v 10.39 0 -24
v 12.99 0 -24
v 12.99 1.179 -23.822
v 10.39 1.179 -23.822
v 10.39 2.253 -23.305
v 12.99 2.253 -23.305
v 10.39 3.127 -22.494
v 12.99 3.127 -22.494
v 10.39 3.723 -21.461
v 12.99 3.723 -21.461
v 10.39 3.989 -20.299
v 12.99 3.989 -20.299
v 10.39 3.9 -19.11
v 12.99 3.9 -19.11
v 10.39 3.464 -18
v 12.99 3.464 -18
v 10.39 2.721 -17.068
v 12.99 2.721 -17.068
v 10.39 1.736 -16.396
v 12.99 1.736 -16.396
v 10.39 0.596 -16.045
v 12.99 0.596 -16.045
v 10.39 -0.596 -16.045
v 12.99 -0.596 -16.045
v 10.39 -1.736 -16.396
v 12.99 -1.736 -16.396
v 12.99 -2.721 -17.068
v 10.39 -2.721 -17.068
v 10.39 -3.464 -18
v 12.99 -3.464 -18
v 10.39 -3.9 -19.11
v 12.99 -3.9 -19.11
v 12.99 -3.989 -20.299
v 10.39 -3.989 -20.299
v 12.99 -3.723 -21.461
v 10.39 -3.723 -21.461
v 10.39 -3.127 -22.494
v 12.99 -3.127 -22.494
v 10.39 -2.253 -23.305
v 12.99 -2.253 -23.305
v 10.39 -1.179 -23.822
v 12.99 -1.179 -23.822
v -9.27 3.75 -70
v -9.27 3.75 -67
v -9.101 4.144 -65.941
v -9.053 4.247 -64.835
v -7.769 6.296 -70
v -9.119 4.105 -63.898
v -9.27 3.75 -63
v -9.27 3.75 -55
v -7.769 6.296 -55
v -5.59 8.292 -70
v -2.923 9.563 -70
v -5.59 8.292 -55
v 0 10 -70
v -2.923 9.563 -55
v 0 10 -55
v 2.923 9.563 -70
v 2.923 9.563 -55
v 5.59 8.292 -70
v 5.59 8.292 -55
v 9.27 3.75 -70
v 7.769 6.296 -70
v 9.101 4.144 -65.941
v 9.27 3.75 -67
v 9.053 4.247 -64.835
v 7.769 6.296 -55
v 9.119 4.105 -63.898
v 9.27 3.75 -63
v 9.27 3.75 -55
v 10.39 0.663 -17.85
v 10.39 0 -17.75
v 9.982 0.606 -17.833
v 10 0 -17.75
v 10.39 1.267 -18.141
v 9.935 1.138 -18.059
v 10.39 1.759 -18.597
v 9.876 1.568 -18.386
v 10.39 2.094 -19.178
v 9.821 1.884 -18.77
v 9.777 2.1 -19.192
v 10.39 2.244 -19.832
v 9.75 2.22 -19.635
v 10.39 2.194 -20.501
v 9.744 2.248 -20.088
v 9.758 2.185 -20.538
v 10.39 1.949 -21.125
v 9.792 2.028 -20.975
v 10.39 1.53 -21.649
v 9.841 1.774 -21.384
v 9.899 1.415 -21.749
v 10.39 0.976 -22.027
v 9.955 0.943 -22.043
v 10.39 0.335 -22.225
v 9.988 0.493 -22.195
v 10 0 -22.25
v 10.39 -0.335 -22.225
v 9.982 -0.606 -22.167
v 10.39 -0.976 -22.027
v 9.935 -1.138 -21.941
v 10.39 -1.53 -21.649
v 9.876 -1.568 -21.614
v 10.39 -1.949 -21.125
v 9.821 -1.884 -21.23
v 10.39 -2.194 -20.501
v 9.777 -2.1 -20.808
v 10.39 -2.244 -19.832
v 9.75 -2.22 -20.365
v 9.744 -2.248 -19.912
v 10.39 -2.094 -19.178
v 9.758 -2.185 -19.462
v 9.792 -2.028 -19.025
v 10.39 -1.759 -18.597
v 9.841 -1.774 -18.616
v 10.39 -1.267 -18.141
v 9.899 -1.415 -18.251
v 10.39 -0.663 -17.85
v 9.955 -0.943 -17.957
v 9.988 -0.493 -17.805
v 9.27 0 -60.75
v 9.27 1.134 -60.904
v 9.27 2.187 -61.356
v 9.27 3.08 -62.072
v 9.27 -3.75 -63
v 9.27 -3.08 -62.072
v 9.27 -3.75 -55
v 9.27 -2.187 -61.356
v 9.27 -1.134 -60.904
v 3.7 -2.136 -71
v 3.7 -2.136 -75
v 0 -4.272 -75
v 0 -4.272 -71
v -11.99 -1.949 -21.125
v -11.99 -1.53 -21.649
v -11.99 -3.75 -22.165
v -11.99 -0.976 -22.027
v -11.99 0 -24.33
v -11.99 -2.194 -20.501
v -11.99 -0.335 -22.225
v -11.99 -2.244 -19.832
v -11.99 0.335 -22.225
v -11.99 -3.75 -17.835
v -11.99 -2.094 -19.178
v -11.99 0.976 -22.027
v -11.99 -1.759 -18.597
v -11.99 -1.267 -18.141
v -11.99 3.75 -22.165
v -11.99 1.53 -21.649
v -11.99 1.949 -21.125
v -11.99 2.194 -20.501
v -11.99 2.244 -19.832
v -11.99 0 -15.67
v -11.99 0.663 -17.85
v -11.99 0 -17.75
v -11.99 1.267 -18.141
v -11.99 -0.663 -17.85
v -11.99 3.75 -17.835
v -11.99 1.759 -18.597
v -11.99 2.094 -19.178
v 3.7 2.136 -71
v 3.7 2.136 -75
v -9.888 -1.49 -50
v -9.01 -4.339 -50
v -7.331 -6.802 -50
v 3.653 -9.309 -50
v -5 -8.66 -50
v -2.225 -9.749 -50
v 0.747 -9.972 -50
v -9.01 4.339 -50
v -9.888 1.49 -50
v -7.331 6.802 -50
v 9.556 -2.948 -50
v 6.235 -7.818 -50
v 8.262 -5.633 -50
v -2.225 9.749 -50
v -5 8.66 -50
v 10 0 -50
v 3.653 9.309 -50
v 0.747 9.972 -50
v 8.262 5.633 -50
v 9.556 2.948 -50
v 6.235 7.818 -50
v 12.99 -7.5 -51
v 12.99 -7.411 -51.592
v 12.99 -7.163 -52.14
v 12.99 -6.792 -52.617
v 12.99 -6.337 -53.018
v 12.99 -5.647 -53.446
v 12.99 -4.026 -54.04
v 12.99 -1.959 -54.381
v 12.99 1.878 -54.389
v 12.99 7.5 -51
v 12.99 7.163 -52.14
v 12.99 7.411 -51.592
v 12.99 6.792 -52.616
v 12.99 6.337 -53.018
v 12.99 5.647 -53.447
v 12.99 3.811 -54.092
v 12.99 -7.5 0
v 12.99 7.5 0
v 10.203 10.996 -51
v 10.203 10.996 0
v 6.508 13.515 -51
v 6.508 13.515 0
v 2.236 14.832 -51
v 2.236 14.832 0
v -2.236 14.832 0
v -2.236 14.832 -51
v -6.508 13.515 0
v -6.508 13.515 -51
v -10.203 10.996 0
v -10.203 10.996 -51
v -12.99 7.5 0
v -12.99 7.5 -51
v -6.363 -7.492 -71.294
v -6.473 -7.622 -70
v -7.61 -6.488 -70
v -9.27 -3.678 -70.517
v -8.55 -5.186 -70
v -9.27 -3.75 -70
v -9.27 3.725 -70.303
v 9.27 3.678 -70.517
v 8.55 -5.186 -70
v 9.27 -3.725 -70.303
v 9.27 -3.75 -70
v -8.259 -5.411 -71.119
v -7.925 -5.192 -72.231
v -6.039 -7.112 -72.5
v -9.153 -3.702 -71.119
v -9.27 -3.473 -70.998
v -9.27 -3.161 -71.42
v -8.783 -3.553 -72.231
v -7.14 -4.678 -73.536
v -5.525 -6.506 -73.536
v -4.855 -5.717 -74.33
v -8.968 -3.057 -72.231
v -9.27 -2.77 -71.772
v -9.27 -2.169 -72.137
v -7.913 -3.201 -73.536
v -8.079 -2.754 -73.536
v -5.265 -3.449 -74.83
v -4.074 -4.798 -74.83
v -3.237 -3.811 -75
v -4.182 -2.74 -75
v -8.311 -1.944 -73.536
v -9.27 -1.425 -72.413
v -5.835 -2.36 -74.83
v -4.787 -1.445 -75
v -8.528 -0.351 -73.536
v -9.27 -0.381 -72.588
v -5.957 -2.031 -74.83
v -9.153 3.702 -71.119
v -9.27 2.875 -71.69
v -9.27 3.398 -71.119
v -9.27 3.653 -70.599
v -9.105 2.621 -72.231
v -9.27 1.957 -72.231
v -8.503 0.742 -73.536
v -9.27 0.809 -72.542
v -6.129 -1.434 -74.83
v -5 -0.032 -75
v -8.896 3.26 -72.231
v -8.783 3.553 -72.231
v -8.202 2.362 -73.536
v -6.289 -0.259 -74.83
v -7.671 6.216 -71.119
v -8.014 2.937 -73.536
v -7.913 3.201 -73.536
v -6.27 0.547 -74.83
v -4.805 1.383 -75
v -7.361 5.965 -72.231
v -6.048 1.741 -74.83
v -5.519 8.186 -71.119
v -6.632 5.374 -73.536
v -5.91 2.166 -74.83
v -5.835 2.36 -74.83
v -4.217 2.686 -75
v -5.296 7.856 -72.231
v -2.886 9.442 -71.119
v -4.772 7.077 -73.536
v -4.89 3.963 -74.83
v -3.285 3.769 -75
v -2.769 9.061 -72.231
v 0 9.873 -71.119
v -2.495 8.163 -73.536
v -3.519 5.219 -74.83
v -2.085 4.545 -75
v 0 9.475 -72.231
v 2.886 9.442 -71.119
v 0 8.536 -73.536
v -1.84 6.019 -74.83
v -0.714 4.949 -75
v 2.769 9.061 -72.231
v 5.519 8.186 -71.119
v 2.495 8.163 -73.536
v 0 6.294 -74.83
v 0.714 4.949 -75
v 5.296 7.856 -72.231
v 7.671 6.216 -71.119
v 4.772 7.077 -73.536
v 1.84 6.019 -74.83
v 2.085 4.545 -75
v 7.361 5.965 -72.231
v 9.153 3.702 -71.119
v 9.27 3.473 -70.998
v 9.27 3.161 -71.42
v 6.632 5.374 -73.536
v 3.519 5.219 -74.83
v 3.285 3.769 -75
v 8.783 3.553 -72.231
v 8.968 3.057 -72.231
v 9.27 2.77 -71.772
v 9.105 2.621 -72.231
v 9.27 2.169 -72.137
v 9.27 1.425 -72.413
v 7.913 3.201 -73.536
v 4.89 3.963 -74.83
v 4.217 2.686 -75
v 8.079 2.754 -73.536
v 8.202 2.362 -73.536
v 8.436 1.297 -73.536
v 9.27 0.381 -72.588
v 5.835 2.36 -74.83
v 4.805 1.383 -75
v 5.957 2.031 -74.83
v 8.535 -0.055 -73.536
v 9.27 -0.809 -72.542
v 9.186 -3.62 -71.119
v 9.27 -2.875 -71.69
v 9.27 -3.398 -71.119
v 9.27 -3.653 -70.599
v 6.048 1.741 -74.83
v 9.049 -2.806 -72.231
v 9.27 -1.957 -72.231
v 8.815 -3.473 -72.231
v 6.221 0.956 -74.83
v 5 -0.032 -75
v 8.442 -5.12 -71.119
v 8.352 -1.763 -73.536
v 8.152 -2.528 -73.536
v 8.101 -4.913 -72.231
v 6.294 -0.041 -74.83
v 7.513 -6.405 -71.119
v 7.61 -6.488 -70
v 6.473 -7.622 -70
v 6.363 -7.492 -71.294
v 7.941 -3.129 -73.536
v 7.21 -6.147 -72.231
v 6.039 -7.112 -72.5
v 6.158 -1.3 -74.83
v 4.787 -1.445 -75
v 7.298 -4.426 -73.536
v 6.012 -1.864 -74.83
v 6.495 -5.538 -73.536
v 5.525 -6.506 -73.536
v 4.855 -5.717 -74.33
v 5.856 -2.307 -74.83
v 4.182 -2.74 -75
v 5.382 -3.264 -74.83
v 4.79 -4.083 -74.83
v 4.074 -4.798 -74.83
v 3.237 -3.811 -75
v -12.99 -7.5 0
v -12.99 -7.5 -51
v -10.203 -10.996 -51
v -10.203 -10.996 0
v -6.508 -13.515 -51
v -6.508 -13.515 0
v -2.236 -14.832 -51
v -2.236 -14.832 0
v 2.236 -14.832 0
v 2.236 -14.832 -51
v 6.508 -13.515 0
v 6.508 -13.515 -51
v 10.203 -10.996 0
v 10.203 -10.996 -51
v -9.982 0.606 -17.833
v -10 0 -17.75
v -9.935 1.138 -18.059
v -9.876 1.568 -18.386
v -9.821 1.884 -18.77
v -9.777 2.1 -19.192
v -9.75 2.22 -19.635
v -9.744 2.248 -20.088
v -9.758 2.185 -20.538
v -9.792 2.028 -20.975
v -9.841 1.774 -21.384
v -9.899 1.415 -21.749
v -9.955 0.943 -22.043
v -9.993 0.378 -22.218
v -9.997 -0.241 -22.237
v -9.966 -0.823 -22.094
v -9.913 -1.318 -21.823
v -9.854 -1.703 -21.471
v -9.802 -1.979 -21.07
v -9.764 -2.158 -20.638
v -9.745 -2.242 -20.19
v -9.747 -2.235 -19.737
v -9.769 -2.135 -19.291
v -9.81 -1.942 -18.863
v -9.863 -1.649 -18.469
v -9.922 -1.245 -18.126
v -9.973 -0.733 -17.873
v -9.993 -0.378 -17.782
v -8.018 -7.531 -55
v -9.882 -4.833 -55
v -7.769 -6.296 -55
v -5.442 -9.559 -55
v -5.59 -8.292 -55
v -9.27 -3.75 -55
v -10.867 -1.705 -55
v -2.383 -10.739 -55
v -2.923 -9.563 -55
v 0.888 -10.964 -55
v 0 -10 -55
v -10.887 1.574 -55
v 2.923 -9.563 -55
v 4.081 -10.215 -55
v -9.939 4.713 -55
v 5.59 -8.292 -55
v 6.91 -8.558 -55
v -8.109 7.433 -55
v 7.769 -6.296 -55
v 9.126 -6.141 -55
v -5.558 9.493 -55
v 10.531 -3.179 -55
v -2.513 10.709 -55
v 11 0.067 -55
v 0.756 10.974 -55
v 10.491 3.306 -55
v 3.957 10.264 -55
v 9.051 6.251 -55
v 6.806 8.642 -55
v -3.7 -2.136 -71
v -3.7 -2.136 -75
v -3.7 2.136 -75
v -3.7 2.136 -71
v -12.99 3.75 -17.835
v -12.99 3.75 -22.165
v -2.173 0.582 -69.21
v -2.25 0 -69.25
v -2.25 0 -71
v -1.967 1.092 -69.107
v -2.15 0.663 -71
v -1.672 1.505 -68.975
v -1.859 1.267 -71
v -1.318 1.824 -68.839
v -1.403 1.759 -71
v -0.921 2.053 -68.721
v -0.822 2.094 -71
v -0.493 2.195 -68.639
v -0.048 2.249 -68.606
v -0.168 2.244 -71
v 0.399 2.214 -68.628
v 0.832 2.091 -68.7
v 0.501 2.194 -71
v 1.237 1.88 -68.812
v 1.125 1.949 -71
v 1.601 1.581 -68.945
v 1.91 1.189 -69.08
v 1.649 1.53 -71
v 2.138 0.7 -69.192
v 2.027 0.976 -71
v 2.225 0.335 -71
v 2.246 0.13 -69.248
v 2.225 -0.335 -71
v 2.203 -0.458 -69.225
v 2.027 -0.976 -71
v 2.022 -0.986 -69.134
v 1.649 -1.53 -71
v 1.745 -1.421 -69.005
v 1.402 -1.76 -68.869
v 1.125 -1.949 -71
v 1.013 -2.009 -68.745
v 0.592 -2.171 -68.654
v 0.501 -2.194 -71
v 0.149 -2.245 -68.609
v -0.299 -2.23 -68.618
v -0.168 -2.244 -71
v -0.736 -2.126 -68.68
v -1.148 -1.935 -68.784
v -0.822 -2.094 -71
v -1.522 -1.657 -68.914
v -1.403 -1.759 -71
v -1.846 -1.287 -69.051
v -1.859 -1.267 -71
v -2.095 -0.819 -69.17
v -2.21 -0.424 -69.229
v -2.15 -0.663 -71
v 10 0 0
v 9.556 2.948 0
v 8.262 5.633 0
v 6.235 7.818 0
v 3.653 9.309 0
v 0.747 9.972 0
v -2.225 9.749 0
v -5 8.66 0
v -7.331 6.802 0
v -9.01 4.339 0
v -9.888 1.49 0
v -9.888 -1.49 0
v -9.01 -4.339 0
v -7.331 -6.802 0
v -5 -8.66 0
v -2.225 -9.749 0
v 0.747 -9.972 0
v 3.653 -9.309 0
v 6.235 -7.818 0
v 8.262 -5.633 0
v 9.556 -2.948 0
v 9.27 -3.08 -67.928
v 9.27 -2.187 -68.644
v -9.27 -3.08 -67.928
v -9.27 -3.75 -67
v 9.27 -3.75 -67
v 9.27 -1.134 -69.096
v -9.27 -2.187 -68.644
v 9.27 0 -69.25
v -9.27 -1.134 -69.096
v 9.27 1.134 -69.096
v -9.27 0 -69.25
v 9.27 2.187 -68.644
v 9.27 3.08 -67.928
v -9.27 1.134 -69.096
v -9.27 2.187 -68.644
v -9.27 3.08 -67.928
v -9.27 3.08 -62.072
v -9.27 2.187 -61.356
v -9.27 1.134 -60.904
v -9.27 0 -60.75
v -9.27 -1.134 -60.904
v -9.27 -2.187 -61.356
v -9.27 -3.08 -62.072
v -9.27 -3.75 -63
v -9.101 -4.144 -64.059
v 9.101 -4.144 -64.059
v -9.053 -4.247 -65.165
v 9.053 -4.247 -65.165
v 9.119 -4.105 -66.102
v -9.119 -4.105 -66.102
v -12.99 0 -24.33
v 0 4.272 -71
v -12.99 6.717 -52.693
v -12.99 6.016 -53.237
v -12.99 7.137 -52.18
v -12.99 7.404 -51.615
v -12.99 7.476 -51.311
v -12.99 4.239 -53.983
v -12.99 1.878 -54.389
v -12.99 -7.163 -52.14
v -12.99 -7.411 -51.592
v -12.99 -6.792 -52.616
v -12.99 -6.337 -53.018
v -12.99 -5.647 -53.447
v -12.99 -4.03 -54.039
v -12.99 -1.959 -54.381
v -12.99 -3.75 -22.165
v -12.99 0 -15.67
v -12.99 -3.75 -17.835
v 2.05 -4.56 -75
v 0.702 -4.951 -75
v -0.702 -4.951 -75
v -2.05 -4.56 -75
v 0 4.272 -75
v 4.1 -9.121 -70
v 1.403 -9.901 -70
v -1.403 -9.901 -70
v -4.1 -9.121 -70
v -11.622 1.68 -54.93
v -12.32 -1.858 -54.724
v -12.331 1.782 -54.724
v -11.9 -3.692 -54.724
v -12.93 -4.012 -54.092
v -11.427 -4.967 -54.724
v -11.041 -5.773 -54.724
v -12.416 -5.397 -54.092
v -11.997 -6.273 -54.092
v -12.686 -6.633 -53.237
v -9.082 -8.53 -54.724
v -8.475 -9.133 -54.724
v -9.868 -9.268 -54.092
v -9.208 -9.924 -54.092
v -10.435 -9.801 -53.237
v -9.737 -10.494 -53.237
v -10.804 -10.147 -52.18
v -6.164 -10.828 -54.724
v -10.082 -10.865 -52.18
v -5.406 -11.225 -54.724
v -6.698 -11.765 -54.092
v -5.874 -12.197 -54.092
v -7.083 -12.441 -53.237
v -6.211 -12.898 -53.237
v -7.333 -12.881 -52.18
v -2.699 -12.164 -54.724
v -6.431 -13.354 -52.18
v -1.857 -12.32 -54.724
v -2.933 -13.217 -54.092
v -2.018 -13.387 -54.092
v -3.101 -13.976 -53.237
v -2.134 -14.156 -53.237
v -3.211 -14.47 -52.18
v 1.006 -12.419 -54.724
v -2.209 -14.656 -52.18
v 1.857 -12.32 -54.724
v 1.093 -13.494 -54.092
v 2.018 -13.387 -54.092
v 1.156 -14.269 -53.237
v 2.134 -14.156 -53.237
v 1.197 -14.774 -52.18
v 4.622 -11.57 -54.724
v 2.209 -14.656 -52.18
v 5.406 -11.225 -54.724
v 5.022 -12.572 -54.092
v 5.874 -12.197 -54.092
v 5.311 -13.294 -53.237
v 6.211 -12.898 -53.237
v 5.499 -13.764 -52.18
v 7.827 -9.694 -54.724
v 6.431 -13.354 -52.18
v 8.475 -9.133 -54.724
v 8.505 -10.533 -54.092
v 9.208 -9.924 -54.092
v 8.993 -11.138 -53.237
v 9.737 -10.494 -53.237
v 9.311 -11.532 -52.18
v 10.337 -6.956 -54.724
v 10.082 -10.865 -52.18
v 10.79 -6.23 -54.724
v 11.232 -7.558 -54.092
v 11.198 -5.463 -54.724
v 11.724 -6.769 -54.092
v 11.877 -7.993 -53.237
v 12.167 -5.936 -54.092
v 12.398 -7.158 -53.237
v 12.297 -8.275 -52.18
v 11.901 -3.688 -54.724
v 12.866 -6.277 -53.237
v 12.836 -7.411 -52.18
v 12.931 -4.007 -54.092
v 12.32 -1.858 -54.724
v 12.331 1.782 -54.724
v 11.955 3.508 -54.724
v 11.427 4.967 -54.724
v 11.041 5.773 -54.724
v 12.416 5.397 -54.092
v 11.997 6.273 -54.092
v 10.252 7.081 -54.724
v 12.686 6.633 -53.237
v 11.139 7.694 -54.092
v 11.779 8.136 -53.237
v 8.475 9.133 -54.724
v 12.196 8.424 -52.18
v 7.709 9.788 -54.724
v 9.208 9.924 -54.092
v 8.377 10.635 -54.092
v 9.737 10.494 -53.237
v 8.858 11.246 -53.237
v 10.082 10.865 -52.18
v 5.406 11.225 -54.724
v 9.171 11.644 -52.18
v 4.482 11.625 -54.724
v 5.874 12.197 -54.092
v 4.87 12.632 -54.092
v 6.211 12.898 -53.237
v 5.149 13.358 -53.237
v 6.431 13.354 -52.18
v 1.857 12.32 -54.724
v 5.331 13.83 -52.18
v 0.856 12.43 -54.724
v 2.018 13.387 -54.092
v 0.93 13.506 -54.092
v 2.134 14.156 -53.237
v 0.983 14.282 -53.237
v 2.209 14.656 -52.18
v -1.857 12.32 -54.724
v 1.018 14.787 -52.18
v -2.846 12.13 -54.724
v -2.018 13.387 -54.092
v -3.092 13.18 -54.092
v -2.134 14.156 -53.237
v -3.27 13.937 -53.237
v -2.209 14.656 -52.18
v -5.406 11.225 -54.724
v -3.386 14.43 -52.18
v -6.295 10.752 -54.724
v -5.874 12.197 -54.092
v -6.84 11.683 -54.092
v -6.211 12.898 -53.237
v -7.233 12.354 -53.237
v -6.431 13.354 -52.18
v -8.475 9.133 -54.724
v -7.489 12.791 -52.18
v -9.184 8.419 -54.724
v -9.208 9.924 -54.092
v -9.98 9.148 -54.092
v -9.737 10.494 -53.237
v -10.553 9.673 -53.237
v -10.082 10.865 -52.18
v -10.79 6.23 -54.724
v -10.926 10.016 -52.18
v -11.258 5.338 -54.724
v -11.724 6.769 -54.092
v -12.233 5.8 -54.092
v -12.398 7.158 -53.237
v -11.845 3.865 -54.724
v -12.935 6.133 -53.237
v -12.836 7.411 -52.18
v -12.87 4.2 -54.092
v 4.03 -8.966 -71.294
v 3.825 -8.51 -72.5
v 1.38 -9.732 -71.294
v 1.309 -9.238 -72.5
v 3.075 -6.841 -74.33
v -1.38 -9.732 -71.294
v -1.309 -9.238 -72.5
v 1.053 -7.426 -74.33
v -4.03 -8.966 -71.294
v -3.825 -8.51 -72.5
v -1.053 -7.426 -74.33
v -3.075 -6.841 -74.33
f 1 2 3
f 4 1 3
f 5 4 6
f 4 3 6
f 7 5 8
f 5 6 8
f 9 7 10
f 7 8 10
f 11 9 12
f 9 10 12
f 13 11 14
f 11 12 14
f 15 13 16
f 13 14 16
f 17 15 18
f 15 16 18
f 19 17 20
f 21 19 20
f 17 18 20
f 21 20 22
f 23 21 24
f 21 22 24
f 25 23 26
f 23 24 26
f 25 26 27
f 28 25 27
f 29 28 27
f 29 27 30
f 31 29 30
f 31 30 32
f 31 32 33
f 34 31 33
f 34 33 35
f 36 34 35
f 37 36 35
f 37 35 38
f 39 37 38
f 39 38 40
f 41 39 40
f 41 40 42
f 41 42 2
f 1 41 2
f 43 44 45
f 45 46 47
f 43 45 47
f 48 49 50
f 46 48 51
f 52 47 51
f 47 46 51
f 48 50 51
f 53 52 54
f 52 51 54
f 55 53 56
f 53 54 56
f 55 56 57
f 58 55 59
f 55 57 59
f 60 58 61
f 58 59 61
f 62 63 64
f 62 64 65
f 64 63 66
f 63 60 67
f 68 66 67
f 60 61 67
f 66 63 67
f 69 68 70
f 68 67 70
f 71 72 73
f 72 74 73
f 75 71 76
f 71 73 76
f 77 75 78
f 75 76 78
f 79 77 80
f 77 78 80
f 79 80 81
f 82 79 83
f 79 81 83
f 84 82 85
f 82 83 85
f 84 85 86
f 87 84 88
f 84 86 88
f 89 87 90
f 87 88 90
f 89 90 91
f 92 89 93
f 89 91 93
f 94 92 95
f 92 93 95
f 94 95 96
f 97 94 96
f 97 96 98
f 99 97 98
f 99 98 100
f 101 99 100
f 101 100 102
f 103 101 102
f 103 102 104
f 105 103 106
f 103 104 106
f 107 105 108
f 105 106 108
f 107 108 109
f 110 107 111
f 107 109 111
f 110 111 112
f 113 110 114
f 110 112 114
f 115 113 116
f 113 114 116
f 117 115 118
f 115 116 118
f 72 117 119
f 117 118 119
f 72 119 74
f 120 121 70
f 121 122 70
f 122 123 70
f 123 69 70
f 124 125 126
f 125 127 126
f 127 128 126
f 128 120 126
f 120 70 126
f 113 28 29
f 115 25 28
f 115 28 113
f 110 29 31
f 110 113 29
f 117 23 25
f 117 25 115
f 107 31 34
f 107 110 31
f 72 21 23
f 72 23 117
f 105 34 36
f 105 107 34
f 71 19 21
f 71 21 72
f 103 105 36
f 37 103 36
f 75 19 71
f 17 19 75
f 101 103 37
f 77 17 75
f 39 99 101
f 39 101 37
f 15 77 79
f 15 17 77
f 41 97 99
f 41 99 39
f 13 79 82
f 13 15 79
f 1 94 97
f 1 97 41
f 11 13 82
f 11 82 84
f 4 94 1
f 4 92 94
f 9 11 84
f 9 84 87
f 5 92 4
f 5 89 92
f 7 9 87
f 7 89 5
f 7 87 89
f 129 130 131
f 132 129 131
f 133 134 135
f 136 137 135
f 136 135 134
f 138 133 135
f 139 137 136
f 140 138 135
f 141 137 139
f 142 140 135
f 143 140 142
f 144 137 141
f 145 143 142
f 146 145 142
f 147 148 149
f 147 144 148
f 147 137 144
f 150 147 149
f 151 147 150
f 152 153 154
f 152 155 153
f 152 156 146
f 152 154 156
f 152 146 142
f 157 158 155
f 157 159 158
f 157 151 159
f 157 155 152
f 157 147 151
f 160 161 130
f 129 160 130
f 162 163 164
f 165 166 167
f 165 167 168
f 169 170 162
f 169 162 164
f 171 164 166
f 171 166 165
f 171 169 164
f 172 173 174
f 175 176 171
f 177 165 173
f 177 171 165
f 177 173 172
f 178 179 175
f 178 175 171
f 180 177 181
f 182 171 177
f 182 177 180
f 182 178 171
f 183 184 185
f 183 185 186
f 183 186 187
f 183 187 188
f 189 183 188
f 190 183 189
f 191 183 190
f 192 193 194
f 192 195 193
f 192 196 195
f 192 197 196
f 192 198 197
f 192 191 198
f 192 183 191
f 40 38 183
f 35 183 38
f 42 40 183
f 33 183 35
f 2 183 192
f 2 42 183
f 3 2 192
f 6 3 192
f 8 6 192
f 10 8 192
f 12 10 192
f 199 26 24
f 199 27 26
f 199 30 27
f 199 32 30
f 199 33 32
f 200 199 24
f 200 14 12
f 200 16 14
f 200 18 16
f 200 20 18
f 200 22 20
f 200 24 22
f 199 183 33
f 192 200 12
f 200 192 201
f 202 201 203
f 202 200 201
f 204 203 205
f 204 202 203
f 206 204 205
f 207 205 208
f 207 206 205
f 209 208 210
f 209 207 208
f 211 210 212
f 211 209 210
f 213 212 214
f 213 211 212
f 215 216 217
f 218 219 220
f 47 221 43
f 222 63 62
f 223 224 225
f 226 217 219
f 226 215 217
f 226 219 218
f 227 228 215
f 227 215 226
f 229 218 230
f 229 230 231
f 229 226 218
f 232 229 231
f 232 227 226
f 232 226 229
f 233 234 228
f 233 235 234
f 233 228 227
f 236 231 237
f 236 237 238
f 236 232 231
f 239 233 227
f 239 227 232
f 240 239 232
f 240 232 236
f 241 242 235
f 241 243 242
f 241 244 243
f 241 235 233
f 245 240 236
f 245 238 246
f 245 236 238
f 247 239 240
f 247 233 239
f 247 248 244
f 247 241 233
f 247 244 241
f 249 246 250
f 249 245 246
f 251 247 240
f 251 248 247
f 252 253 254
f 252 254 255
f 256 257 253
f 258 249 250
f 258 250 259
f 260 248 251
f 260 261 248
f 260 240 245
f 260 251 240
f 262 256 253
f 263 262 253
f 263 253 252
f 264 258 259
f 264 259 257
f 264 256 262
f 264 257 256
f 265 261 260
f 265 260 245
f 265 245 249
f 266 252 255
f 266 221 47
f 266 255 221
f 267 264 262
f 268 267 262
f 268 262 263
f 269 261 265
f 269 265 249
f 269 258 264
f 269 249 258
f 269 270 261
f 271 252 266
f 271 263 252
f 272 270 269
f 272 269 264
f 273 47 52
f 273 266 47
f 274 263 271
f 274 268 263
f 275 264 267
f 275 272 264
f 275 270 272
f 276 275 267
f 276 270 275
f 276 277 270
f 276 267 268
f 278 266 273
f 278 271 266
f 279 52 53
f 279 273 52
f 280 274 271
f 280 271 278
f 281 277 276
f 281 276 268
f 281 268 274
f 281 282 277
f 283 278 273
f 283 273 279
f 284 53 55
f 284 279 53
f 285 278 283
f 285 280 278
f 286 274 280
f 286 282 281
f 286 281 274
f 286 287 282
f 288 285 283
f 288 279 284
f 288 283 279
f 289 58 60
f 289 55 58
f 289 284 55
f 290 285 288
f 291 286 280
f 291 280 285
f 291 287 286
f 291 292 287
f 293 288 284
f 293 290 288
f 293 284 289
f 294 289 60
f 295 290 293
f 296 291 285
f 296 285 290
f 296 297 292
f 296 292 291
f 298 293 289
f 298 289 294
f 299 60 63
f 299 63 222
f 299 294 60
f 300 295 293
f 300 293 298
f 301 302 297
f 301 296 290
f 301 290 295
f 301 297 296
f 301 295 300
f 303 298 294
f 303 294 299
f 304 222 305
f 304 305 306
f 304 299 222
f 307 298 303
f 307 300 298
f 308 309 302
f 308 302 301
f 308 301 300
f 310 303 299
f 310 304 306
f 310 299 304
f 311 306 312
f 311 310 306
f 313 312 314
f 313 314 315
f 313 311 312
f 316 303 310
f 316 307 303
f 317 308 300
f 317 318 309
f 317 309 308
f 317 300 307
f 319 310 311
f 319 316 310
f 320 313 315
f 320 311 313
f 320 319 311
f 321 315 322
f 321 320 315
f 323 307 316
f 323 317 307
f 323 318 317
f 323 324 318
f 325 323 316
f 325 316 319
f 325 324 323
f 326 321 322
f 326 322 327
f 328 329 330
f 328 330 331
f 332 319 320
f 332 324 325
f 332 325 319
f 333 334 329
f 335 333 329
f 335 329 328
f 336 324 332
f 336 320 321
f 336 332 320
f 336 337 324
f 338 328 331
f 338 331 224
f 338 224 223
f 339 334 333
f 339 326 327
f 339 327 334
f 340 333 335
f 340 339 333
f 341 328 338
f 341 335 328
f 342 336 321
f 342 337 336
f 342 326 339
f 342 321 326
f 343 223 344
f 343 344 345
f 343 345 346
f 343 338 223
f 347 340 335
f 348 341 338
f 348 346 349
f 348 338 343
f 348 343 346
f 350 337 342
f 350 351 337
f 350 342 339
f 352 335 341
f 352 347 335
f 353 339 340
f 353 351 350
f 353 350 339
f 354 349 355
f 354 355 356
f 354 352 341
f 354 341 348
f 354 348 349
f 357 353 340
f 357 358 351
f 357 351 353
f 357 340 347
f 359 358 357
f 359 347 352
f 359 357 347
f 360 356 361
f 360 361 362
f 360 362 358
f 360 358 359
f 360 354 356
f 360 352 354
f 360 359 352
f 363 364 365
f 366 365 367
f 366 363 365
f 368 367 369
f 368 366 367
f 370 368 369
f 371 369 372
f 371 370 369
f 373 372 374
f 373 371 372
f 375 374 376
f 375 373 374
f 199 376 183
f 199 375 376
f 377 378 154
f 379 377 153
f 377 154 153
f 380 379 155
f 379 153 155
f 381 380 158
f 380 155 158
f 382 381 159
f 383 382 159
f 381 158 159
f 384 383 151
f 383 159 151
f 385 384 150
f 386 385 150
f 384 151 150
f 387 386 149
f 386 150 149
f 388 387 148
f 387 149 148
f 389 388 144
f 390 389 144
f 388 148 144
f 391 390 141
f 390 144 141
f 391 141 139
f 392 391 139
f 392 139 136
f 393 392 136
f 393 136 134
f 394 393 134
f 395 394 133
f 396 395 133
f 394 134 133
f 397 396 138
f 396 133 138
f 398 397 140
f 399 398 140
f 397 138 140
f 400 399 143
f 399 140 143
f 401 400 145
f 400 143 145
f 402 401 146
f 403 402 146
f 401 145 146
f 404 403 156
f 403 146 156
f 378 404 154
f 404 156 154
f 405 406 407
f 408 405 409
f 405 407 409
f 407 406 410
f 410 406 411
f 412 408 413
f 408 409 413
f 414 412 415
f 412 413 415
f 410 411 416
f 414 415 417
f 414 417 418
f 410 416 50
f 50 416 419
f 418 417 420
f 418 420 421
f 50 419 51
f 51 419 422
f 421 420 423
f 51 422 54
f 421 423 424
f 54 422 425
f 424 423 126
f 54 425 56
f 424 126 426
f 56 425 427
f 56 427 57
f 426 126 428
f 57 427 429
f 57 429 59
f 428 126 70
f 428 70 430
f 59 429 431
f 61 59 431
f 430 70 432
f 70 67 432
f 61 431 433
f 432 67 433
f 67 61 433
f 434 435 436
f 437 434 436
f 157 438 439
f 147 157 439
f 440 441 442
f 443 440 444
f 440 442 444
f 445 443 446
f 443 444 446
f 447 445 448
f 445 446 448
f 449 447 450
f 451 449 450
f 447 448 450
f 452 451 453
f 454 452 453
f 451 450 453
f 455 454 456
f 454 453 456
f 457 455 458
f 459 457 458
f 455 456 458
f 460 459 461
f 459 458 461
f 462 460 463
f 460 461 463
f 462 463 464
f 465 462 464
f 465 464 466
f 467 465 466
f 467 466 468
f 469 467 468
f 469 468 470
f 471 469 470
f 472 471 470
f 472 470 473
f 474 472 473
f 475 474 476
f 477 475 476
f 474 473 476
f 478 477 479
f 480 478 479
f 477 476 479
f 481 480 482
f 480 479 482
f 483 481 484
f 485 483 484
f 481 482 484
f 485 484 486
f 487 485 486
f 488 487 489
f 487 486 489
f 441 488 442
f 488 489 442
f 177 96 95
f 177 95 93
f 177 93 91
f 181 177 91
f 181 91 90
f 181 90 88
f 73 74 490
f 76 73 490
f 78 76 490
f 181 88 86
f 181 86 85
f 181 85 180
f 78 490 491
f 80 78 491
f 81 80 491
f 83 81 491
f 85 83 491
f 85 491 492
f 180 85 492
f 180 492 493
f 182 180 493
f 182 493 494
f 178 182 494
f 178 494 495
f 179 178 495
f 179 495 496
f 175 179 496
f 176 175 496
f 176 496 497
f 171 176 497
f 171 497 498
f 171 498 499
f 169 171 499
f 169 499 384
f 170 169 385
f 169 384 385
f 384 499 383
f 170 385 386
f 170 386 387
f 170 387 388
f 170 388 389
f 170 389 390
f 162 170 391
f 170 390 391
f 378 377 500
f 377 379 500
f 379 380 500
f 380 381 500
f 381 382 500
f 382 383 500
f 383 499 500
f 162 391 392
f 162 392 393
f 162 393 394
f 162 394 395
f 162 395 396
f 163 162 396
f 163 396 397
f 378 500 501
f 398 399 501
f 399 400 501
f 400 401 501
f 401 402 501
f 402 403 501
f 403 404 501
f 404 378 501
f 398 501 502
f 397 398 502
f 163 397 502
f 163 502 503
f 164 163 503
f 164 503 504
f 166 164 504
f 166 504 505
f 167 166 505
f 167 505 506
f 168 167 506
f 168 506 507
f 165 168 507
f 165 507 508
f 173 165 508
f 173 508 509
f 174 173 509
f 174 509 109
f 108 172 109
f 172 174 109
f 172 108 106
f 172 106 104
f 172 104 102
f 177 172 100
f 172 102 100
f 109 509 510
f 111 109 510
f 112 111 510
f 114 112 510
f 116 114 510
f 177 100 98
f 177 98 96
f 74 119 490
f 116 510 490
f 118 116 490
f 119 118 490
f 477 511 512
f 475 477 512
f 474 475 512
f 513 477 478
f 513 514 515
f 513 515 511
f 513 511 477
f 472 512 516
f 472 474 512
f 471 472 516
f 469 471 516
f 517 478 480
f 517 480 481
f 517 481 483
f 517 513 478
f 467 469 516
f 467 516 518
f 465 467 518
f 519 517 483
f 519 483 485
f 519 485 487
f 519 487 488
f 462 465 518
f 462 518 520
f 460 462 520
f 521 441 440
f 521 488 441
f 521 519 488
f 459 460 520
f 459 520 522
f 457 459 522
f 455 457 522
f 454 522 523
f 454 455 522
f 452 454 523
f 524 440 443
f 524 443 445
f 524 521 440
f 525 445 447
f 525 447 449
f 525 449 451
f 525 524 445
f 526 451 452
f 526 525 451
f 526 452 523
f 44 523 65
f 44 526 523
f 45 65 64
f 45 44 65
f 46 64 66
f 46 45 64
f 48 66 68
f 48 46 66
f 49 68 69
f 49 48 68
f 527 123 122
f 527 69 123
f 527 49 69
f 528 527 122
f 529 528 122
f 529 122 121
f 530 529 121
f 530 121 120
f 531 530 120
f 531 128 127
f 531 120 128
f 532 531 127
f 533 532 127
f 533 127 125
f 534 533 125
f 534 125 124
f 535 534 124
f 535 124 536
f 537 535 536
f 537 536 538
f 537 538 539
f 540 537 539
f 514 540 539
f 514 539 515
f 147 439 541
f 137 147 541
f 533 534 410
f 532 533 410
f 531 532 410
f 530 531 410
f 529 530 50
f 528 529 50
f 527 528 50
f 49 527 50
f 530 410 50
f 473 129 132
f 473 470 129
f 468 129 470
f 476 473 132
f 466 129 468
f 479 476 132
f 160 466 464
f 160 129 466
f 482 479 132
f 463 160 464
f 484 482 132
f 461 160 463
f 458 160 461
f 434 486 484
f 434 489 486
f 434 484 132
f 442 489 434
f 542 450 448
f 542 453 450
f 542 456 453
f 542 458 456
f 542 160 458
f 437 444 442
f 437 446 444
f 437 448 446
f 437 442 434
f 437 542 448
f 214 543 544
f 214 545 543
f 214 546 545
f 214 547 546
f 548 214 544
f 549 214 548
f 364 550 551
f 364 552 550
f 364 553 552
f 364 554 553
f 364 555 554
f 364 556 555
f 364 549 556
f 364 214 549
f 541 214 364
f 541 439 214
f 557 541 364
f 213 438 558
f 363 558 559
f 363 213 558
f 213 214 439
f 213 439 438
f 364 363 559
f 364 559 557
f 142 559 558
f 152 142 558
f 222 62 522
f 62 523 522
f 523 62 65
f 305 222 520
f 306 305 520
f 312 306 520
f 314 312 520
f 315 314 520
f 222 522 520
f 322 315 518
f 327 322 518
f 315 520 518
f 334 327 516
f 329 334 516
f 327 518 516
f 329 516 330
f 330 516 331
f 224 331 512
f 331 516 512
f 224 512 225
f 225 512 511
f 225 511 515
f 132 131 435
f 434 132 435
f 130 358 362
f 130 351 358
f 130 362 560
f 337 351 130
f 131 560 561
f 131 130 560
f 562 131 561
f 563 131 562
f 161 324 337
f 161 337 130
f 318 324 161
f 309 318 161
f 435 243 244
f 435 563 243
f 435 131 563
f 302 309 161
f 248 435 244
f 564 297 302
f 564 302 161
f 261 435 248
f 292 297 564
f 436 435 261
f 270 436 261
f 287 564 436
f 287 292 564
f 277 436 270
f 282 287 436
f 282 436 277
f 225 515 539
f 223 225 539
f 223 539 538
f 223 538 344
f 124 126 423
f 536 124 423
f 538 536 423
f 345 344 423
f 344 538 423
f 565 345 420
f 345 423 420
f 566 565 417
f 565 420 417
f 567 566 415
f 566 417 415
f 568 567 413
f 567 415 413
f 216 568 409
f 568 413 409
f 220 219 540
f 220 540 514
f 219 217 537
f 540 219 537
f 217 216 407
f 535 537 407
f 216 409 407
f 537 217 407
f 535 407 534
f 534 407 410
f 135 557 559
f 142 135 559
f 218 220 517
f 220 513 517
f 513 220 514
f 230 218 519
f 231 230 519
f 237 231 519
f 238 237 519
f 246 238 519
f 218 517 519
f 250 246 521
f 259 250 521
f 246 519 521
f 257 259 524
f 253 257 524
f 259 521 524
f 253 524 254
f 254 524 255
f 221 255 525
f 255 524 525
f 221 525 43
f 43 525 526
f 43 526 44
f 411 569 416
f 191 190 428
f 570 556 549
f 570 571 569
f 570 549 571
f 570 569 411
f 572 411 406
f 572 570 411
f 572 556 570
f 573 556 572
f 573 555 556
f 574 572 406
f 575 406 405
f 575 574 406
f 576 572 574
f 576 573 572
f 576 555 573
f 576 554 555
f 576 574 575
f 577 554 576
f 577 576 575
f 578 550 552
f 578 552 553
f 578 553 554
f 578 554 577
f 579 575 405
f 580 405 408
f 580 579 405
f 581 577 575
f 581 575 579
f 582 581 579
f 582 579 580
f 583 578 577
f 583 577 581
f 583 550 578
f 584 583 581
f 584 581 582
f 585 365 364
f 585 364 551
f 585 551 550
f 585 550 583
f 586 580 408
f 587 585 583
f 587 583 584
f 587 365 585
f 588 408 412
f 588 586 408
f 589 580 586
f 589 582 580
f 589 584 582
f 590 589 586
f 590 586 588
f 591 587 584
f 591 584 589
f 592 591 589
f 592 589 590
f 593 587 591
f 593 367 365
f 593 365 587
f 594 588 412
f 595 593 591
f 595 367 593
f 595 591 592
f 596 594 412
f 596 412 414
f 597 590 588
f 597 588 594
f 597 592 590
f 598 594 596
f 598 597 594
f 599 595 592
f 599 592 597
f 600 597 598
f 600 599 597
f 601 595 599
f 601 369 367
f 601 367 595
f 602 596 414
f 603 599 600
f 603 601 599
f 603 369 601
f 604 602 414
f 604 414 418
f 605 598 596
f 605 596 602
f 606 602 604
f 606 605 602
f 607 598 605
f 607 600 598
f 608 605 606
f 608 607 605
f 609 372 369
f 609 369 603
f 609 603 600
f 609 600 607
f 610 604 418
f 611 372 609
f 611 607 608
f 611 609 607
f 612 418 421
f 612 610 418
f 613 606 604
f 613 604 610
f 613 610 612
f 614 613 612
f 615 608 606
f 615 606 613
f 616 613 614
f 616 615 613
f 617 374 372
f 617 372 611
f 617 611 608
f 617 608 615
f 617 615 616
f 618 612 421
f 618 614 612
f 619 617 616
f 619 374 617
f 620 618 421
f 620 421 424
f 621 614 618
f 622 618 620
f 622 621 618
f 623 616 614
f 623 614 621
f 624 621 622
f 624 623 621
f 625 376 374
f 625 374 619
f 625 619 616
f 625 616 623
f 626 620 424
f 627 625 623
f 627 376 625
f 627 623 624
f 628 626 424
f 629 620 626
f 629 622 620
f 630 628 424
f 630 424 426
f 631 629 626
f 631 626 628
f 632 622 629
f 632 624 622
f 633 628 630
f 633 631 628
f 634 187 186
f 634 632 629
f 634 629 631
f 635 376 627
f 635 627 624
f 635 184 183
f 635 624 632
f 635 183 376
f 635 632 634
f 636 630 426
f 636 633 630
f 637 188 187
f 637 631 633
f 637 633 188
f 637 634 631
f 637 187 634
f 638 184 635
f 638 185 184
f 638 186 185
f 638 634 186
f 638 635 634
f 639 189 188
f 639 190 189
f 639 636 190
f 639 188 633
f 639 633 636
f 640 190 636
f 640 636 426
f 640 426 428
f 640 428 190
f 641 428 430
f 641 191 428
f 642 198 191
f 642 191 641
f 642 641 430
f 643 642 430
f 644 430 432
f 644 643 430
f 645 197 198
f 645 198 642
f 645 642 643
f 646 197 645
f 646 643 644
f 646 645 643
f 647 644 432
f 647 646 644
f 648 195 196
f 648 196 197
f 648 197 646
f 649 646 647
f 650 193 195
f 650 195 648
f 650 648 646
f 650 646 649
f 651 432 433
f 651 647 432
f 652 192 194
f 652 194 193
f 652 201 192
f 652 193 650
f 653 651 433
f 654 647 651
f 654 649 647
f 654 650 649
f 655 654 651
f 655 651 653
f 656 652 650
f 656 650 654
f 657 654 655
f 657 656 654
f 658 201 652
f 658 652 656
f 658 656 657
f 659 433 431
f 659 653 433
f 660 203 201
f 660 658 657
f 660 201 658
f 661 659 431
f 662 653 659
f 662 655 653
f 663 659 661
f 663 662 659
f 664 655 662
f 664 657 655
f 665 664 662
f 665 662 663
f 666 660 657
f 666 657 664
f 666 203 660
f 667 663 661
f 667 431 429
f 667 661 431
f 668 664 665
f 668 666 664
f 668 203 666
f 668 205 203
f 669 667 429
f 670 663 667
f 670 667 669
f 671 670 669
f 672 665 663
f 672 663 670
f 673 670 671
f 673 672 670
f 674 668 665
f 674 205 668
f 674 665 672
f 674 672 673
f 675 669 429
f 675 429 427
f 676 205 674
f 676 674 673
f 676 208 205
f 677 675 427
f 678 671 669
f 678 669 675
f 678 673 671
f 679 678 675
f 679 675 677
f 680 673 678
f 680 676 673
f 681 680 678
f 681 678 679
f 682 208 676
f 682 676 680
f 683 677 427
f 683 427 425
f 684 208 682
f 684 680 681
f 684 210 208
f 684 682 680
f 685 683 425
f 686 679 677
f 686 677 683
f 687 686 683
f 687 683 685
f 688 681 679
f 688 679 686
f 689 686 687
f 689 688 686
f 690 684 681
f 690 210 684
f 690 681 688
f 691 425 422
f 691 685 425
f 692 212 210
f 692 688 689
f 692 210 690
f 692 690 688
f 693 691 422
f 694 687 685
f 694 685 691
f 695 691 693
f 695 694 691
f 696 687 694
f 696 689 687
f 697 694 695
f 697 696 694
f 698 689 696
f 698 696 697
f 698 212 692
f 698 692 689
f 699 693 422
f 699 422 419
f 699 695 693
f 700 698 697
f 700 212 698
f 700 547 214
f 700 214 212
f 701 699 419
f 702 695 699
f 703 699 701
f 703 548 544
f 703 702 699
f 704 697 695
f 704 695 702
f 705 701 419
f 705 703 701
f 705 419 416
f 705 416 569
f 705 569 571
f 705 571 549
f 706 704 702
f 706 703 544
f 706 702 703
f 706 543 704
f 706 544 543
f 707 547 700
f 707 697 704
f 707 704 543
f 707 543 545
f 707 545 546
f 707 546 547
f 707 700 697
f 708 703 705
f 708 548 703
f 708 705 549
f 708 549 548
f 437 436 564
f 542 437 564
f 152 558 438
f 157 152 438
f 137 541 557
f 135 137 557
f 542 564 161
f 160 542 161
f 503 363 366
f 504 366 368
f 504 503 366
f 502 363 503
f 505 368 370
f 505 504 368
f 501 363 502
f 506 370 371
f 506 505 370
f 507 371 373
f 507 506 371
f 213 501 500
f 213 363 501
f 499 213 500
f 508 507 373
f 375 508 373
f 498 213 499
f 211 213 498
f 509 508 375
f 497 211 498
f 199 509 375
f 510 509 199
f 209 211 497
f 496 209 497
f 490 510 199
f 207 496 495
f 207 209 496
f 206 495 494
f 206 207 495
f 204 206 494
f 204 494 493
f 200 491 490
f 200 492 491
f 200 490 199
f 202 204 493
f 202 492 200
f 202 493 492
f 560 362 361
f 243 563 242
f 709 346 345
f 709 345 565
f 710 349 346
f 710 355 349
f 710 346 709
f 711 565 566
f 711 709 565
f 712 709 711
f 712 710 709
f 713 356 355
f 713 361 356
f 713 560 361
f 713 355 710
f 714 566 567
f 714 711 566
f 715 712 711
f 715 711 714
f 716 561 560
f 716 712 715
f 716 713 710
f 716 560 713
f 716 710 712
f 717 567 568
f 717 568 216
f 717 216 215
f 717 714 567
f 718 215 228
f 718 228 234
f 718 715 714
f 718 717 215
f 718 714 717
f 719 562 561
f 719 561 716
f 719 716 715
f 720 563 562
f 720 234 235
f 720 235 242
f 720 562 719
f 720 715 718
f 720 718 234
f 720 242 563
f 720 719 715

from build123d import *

# Parameters (mm, degrees)
BOSS_EXTRUDE2_DEPTH                         = 55
BOSS_EXTRUDE4_DEPTH                         = 20
CUT_EXTRUDE4_DEPTH                          = 78.580603246
CUT_EXTRUDE4_DEPTH_BACK                     = 78.580603246
SKETCH7_R                                   = 4.25
CUT_EXTRUDE5_REACH                          = 79.581
CUT_EXTRUDE5_END_RADIUS                     = 4.25
SKETCH8_R                                   = 2.25
CUT_EXTRUDE6_DEPTH                          = 4
SKETCH2_5_R                                 = 10
CUT_EXTRUDE7_DEPTH                          = 50
FILLET1_R                                   = 4
FILLET3_R                                   = 5
CBORE_FOR_M4_CHEESE_HEAD_SCREW1_D           = 4.5
CBORE_FOR_M4_CHEESE_HEAD_SCREW1_CBORE_D     = 8
CBORE_FOR_M4_CHEESE_HEAD_SCREW1_CBORE_DEPTH = 2.6
CUT_EXTRUDE8_DEPTH                          = 1


with BuildPart() as part:
    # Sketch2 → Boss-Extrude2 (new body)
    with BuildSketch(Plane.XY):
        with BuildLine():
            Line((12.990381057, -7.5), (12.990381057, 7.5))
            ThreePointArc((12.990381057, 7.5), (0, 15), (-12.990381057, 7.5))
            Line((-12.990381057, 7.5), (-12.990381057, -7.5))
            ThreePointArc((-12.990381057, -7.5), (0, -15), (12.990381057, -7.5))
        make_face()
    extrude(amount=-BOSS_EXTRUDE2_DEPTH)

    # Sketch6 → Boss-Extrude4 (add)
    with BuildSketch(Plane(origin=(0, 0, -55), x_dir=(-1, 0, 0), z_dir=(0, 0, -1))):
        with BuildLine():
            ThreePointArc((9.270248109, 3.75), (0, 10), (-9.270248109, 3.75))
            Line((-9.270248109, 3.75), (-9.270248109, -3.75))
            ThreePointArc((-9.270248109, -3.75), (0, -10), (9.270248109, -3.75))
            Line((9.270248109, -3.75), (9.270248109, 3.75))
        make_face()
    extrude(amount=BOSS_EXTRUDE4_DEPTH)

    # Sketch7 → Cut-Extrude4 (cut, two sides: drawn at the far end of the back side and taken through both)
    with BuildSketch(Plane(origin=(0, 0, 0), x_dir=(0, 0, -1), z_dir=(1, 0, 0)).offset(-CUT_EXTRUDE4_DEPTH_BACK)):
        with Locations(Location((65, 0, 0), (0, 0, 298.072486936))):
            Circle(SKETCH7_R)
    extrude(amount=CUT_EXTRUDE4_DEPTH + CUT_EXTRUDE4_DEPTH_BACK, mode=Mode.SUBTRACT)

    # Cut-Extrude5: up to this cylinder (the profile starts outside it)
    cut_extrude5_end = Plane(origin=(0, 0, -65), z_dir=(1, 0, 0)) * Cylinder(CUT_EXTRUDE5_END_RADIUS, 168.662, mode=Mode.PRIVATE)
    # Sketch8 → Cut-Extrude5 (cut, up to the surface)
    with BuildSketch(Plane(origin=(0, 0, -75), x_dir=(-1, 0, 0), z_dir=(0, 0, -1)), mode=Mode.PRIVATE) as cut_extrude5_sk1:
        Circle(SKETCH8_R)
    cut_extrude5_tool1 = extrude(cut_extrude5_sk1.sketch, amount=-CUT_EXTRUDE5_REACH, mode=Mode.PRIVATE) - cut_extrude5_end
    add(cut_extrude5_tool1.solids().sort_by_distance((0, 0, -75))[0], mode=Mode.SUBTRACT)

    # Sketch8<3> → Cut-Extrude6 (cut)
    with BuildSketch(Plane(origin=(0, 0, -75), x_dir=(-1, 0, 0), z_dir=(0, 0, -1))):
        Polygon((3.7, -2.136195996), (3.7, 2.136195996), (0, 4.272391992), (-3.7, 2.136195996), (-3.7, -2.136195996), (0, -4.272391992), align=None)
    extrude(amount=-CUT_EXTRUDE6_DEPTH, mode=Mode.SUBTRACT)

    # Sketch2<5> → Cut-Extrude7 (cut)
    with BuildSketch(Plane.XY):
        Circle(SKETCH2_5_R)
    extrude(amount=-CUT_EXTRUDE7_DEPTH, mode=Mode.SUBTRACT)

    # Fillet1
    # the kernel refuses this fillet: 4 mm, written as the material it takes off along each edge
    with BuildSketch(Plane(origin=(0, 0, -55), x_dir=(-0.9897152245182474, 0.1430516492627579, 0), z_dir=(0.1430516492627579, 0.9897152245182474, 0))) as fillet1_piece_1:
        with BuildLine():
            CenterArc((15 - FILLET1_R, FILLET1_R), FILLET1_R, 270, 90)
            Line((15 - FILLET1_R, 0), (15, 0))
            Line((15, 0), (15, FILLET1_R))
        make_face()
    revolve(axis=Axis((0, 0, -55), (0, 0, 1)), revolution_arc=196.448941493, mode=Mode.SUBTRACT)
    with BuildSketch(Plane(origin=(0, 0, -55), x_dir=(0.9897152245182473, -0.14305164926275812, 0), z_dir=(-0.14305164926275812, -0.9897152245182473, 0))) as fillet1_piece_2:
        with BuildLine():
            CenterArc((15 - FILLET1_R, FILLET1_R), FILLET1_R, 270, 90)
            Line((15 - FILLET1_R, 0), (15, 0))
            Line((15, 0), (15, FILLET1_R))
        make_face()
    revolve(axis=Axis((0, 0, -55), (0, 0, 1)), revolution_arc=196.448941493, mode=Mode.SUBTRACT)

    # Fillet3
    # the kernel refuses this fillet: 5 mm, written as the material it takes off along each edge
    with BuildSketch(Plane(origin=(0, 0, -75), x_dir=(-0.647307646342804, -0.7622288442365189, 0), z_dir=(0.7622288442365189, -0.647307646342804, 0))) as fillet3_piece_1:
        with BuildLine():
            CenterArc((10 - FILLET3_R, -FILLET3_R), FILLET3_R, 0, 90)
            Line((10, -FILLET3_R), (10, 0))
            Line((10, 0), (10 - FILLET3_R, 0))
        make_face()
    revolve(axis=Axis((0, 0, -75), (0, 0, -1)), revolution_arc=279.32216765, mode=Mode.SUBTRACT)
    with BuildSketch(Plane(origin=(0, 0, -75), x_dir=(0.6473076463428042, 0.7622288442365188, 0), z_dir=(-0.7622288442365188, 0.6473076463428042, 0))) as fillet3_piece_2:
        with BuildLine():
            CenterArc((10 - FILLET3_R, -FILLET3_R), FILLET3_R, 0, 90)
            Line((10, -FILLET3_R), (10, 0))
            Line((10, 0), (10 - FILLET3_R, 0))
        make_face()
    revolve(axis=Axis((0, 0, -75), (0, 0, -1)), revolution_arc=279.32216765, mode=Mode.SUBTRACT)

    # CBORE for M4 Cheese Head Screw1 (through all)
    with Locations(Plane(origin=(12.990381057, 0, 0), x_dir=(0, 0, -1), z_dir=(1, 0, 0))):
        with Locations((20, 0)):
            CounterBoreHole(CBORE_FOR_M4_CHEESE_HEAD_SCREW1_D / 2, CBORE_FOR_M4_CHEESE_HEAD_SCREW1_CBORE_D / 2, CBORE_FOR_M4_CHEESE_HEAD_SCREW1_CBORE_DEPTH)

    # Sketch9 → Cut-Extrude8 (cut)
    with BuildSketch(Plane.ZY.offset(12.990381057)):
        Polygon((-15.669872981, 0), (-17.834936491, 3.75), (-22.165063509, 3.75), (-24.330127019, 0), (-22.165063509, -3.75), (-17.834936491, -3.75), align=None)
    extrude(amount=-CUT_EXTRUDE8_DEPTH, mode=Mode.SUBTRACT)


solid = part.part
